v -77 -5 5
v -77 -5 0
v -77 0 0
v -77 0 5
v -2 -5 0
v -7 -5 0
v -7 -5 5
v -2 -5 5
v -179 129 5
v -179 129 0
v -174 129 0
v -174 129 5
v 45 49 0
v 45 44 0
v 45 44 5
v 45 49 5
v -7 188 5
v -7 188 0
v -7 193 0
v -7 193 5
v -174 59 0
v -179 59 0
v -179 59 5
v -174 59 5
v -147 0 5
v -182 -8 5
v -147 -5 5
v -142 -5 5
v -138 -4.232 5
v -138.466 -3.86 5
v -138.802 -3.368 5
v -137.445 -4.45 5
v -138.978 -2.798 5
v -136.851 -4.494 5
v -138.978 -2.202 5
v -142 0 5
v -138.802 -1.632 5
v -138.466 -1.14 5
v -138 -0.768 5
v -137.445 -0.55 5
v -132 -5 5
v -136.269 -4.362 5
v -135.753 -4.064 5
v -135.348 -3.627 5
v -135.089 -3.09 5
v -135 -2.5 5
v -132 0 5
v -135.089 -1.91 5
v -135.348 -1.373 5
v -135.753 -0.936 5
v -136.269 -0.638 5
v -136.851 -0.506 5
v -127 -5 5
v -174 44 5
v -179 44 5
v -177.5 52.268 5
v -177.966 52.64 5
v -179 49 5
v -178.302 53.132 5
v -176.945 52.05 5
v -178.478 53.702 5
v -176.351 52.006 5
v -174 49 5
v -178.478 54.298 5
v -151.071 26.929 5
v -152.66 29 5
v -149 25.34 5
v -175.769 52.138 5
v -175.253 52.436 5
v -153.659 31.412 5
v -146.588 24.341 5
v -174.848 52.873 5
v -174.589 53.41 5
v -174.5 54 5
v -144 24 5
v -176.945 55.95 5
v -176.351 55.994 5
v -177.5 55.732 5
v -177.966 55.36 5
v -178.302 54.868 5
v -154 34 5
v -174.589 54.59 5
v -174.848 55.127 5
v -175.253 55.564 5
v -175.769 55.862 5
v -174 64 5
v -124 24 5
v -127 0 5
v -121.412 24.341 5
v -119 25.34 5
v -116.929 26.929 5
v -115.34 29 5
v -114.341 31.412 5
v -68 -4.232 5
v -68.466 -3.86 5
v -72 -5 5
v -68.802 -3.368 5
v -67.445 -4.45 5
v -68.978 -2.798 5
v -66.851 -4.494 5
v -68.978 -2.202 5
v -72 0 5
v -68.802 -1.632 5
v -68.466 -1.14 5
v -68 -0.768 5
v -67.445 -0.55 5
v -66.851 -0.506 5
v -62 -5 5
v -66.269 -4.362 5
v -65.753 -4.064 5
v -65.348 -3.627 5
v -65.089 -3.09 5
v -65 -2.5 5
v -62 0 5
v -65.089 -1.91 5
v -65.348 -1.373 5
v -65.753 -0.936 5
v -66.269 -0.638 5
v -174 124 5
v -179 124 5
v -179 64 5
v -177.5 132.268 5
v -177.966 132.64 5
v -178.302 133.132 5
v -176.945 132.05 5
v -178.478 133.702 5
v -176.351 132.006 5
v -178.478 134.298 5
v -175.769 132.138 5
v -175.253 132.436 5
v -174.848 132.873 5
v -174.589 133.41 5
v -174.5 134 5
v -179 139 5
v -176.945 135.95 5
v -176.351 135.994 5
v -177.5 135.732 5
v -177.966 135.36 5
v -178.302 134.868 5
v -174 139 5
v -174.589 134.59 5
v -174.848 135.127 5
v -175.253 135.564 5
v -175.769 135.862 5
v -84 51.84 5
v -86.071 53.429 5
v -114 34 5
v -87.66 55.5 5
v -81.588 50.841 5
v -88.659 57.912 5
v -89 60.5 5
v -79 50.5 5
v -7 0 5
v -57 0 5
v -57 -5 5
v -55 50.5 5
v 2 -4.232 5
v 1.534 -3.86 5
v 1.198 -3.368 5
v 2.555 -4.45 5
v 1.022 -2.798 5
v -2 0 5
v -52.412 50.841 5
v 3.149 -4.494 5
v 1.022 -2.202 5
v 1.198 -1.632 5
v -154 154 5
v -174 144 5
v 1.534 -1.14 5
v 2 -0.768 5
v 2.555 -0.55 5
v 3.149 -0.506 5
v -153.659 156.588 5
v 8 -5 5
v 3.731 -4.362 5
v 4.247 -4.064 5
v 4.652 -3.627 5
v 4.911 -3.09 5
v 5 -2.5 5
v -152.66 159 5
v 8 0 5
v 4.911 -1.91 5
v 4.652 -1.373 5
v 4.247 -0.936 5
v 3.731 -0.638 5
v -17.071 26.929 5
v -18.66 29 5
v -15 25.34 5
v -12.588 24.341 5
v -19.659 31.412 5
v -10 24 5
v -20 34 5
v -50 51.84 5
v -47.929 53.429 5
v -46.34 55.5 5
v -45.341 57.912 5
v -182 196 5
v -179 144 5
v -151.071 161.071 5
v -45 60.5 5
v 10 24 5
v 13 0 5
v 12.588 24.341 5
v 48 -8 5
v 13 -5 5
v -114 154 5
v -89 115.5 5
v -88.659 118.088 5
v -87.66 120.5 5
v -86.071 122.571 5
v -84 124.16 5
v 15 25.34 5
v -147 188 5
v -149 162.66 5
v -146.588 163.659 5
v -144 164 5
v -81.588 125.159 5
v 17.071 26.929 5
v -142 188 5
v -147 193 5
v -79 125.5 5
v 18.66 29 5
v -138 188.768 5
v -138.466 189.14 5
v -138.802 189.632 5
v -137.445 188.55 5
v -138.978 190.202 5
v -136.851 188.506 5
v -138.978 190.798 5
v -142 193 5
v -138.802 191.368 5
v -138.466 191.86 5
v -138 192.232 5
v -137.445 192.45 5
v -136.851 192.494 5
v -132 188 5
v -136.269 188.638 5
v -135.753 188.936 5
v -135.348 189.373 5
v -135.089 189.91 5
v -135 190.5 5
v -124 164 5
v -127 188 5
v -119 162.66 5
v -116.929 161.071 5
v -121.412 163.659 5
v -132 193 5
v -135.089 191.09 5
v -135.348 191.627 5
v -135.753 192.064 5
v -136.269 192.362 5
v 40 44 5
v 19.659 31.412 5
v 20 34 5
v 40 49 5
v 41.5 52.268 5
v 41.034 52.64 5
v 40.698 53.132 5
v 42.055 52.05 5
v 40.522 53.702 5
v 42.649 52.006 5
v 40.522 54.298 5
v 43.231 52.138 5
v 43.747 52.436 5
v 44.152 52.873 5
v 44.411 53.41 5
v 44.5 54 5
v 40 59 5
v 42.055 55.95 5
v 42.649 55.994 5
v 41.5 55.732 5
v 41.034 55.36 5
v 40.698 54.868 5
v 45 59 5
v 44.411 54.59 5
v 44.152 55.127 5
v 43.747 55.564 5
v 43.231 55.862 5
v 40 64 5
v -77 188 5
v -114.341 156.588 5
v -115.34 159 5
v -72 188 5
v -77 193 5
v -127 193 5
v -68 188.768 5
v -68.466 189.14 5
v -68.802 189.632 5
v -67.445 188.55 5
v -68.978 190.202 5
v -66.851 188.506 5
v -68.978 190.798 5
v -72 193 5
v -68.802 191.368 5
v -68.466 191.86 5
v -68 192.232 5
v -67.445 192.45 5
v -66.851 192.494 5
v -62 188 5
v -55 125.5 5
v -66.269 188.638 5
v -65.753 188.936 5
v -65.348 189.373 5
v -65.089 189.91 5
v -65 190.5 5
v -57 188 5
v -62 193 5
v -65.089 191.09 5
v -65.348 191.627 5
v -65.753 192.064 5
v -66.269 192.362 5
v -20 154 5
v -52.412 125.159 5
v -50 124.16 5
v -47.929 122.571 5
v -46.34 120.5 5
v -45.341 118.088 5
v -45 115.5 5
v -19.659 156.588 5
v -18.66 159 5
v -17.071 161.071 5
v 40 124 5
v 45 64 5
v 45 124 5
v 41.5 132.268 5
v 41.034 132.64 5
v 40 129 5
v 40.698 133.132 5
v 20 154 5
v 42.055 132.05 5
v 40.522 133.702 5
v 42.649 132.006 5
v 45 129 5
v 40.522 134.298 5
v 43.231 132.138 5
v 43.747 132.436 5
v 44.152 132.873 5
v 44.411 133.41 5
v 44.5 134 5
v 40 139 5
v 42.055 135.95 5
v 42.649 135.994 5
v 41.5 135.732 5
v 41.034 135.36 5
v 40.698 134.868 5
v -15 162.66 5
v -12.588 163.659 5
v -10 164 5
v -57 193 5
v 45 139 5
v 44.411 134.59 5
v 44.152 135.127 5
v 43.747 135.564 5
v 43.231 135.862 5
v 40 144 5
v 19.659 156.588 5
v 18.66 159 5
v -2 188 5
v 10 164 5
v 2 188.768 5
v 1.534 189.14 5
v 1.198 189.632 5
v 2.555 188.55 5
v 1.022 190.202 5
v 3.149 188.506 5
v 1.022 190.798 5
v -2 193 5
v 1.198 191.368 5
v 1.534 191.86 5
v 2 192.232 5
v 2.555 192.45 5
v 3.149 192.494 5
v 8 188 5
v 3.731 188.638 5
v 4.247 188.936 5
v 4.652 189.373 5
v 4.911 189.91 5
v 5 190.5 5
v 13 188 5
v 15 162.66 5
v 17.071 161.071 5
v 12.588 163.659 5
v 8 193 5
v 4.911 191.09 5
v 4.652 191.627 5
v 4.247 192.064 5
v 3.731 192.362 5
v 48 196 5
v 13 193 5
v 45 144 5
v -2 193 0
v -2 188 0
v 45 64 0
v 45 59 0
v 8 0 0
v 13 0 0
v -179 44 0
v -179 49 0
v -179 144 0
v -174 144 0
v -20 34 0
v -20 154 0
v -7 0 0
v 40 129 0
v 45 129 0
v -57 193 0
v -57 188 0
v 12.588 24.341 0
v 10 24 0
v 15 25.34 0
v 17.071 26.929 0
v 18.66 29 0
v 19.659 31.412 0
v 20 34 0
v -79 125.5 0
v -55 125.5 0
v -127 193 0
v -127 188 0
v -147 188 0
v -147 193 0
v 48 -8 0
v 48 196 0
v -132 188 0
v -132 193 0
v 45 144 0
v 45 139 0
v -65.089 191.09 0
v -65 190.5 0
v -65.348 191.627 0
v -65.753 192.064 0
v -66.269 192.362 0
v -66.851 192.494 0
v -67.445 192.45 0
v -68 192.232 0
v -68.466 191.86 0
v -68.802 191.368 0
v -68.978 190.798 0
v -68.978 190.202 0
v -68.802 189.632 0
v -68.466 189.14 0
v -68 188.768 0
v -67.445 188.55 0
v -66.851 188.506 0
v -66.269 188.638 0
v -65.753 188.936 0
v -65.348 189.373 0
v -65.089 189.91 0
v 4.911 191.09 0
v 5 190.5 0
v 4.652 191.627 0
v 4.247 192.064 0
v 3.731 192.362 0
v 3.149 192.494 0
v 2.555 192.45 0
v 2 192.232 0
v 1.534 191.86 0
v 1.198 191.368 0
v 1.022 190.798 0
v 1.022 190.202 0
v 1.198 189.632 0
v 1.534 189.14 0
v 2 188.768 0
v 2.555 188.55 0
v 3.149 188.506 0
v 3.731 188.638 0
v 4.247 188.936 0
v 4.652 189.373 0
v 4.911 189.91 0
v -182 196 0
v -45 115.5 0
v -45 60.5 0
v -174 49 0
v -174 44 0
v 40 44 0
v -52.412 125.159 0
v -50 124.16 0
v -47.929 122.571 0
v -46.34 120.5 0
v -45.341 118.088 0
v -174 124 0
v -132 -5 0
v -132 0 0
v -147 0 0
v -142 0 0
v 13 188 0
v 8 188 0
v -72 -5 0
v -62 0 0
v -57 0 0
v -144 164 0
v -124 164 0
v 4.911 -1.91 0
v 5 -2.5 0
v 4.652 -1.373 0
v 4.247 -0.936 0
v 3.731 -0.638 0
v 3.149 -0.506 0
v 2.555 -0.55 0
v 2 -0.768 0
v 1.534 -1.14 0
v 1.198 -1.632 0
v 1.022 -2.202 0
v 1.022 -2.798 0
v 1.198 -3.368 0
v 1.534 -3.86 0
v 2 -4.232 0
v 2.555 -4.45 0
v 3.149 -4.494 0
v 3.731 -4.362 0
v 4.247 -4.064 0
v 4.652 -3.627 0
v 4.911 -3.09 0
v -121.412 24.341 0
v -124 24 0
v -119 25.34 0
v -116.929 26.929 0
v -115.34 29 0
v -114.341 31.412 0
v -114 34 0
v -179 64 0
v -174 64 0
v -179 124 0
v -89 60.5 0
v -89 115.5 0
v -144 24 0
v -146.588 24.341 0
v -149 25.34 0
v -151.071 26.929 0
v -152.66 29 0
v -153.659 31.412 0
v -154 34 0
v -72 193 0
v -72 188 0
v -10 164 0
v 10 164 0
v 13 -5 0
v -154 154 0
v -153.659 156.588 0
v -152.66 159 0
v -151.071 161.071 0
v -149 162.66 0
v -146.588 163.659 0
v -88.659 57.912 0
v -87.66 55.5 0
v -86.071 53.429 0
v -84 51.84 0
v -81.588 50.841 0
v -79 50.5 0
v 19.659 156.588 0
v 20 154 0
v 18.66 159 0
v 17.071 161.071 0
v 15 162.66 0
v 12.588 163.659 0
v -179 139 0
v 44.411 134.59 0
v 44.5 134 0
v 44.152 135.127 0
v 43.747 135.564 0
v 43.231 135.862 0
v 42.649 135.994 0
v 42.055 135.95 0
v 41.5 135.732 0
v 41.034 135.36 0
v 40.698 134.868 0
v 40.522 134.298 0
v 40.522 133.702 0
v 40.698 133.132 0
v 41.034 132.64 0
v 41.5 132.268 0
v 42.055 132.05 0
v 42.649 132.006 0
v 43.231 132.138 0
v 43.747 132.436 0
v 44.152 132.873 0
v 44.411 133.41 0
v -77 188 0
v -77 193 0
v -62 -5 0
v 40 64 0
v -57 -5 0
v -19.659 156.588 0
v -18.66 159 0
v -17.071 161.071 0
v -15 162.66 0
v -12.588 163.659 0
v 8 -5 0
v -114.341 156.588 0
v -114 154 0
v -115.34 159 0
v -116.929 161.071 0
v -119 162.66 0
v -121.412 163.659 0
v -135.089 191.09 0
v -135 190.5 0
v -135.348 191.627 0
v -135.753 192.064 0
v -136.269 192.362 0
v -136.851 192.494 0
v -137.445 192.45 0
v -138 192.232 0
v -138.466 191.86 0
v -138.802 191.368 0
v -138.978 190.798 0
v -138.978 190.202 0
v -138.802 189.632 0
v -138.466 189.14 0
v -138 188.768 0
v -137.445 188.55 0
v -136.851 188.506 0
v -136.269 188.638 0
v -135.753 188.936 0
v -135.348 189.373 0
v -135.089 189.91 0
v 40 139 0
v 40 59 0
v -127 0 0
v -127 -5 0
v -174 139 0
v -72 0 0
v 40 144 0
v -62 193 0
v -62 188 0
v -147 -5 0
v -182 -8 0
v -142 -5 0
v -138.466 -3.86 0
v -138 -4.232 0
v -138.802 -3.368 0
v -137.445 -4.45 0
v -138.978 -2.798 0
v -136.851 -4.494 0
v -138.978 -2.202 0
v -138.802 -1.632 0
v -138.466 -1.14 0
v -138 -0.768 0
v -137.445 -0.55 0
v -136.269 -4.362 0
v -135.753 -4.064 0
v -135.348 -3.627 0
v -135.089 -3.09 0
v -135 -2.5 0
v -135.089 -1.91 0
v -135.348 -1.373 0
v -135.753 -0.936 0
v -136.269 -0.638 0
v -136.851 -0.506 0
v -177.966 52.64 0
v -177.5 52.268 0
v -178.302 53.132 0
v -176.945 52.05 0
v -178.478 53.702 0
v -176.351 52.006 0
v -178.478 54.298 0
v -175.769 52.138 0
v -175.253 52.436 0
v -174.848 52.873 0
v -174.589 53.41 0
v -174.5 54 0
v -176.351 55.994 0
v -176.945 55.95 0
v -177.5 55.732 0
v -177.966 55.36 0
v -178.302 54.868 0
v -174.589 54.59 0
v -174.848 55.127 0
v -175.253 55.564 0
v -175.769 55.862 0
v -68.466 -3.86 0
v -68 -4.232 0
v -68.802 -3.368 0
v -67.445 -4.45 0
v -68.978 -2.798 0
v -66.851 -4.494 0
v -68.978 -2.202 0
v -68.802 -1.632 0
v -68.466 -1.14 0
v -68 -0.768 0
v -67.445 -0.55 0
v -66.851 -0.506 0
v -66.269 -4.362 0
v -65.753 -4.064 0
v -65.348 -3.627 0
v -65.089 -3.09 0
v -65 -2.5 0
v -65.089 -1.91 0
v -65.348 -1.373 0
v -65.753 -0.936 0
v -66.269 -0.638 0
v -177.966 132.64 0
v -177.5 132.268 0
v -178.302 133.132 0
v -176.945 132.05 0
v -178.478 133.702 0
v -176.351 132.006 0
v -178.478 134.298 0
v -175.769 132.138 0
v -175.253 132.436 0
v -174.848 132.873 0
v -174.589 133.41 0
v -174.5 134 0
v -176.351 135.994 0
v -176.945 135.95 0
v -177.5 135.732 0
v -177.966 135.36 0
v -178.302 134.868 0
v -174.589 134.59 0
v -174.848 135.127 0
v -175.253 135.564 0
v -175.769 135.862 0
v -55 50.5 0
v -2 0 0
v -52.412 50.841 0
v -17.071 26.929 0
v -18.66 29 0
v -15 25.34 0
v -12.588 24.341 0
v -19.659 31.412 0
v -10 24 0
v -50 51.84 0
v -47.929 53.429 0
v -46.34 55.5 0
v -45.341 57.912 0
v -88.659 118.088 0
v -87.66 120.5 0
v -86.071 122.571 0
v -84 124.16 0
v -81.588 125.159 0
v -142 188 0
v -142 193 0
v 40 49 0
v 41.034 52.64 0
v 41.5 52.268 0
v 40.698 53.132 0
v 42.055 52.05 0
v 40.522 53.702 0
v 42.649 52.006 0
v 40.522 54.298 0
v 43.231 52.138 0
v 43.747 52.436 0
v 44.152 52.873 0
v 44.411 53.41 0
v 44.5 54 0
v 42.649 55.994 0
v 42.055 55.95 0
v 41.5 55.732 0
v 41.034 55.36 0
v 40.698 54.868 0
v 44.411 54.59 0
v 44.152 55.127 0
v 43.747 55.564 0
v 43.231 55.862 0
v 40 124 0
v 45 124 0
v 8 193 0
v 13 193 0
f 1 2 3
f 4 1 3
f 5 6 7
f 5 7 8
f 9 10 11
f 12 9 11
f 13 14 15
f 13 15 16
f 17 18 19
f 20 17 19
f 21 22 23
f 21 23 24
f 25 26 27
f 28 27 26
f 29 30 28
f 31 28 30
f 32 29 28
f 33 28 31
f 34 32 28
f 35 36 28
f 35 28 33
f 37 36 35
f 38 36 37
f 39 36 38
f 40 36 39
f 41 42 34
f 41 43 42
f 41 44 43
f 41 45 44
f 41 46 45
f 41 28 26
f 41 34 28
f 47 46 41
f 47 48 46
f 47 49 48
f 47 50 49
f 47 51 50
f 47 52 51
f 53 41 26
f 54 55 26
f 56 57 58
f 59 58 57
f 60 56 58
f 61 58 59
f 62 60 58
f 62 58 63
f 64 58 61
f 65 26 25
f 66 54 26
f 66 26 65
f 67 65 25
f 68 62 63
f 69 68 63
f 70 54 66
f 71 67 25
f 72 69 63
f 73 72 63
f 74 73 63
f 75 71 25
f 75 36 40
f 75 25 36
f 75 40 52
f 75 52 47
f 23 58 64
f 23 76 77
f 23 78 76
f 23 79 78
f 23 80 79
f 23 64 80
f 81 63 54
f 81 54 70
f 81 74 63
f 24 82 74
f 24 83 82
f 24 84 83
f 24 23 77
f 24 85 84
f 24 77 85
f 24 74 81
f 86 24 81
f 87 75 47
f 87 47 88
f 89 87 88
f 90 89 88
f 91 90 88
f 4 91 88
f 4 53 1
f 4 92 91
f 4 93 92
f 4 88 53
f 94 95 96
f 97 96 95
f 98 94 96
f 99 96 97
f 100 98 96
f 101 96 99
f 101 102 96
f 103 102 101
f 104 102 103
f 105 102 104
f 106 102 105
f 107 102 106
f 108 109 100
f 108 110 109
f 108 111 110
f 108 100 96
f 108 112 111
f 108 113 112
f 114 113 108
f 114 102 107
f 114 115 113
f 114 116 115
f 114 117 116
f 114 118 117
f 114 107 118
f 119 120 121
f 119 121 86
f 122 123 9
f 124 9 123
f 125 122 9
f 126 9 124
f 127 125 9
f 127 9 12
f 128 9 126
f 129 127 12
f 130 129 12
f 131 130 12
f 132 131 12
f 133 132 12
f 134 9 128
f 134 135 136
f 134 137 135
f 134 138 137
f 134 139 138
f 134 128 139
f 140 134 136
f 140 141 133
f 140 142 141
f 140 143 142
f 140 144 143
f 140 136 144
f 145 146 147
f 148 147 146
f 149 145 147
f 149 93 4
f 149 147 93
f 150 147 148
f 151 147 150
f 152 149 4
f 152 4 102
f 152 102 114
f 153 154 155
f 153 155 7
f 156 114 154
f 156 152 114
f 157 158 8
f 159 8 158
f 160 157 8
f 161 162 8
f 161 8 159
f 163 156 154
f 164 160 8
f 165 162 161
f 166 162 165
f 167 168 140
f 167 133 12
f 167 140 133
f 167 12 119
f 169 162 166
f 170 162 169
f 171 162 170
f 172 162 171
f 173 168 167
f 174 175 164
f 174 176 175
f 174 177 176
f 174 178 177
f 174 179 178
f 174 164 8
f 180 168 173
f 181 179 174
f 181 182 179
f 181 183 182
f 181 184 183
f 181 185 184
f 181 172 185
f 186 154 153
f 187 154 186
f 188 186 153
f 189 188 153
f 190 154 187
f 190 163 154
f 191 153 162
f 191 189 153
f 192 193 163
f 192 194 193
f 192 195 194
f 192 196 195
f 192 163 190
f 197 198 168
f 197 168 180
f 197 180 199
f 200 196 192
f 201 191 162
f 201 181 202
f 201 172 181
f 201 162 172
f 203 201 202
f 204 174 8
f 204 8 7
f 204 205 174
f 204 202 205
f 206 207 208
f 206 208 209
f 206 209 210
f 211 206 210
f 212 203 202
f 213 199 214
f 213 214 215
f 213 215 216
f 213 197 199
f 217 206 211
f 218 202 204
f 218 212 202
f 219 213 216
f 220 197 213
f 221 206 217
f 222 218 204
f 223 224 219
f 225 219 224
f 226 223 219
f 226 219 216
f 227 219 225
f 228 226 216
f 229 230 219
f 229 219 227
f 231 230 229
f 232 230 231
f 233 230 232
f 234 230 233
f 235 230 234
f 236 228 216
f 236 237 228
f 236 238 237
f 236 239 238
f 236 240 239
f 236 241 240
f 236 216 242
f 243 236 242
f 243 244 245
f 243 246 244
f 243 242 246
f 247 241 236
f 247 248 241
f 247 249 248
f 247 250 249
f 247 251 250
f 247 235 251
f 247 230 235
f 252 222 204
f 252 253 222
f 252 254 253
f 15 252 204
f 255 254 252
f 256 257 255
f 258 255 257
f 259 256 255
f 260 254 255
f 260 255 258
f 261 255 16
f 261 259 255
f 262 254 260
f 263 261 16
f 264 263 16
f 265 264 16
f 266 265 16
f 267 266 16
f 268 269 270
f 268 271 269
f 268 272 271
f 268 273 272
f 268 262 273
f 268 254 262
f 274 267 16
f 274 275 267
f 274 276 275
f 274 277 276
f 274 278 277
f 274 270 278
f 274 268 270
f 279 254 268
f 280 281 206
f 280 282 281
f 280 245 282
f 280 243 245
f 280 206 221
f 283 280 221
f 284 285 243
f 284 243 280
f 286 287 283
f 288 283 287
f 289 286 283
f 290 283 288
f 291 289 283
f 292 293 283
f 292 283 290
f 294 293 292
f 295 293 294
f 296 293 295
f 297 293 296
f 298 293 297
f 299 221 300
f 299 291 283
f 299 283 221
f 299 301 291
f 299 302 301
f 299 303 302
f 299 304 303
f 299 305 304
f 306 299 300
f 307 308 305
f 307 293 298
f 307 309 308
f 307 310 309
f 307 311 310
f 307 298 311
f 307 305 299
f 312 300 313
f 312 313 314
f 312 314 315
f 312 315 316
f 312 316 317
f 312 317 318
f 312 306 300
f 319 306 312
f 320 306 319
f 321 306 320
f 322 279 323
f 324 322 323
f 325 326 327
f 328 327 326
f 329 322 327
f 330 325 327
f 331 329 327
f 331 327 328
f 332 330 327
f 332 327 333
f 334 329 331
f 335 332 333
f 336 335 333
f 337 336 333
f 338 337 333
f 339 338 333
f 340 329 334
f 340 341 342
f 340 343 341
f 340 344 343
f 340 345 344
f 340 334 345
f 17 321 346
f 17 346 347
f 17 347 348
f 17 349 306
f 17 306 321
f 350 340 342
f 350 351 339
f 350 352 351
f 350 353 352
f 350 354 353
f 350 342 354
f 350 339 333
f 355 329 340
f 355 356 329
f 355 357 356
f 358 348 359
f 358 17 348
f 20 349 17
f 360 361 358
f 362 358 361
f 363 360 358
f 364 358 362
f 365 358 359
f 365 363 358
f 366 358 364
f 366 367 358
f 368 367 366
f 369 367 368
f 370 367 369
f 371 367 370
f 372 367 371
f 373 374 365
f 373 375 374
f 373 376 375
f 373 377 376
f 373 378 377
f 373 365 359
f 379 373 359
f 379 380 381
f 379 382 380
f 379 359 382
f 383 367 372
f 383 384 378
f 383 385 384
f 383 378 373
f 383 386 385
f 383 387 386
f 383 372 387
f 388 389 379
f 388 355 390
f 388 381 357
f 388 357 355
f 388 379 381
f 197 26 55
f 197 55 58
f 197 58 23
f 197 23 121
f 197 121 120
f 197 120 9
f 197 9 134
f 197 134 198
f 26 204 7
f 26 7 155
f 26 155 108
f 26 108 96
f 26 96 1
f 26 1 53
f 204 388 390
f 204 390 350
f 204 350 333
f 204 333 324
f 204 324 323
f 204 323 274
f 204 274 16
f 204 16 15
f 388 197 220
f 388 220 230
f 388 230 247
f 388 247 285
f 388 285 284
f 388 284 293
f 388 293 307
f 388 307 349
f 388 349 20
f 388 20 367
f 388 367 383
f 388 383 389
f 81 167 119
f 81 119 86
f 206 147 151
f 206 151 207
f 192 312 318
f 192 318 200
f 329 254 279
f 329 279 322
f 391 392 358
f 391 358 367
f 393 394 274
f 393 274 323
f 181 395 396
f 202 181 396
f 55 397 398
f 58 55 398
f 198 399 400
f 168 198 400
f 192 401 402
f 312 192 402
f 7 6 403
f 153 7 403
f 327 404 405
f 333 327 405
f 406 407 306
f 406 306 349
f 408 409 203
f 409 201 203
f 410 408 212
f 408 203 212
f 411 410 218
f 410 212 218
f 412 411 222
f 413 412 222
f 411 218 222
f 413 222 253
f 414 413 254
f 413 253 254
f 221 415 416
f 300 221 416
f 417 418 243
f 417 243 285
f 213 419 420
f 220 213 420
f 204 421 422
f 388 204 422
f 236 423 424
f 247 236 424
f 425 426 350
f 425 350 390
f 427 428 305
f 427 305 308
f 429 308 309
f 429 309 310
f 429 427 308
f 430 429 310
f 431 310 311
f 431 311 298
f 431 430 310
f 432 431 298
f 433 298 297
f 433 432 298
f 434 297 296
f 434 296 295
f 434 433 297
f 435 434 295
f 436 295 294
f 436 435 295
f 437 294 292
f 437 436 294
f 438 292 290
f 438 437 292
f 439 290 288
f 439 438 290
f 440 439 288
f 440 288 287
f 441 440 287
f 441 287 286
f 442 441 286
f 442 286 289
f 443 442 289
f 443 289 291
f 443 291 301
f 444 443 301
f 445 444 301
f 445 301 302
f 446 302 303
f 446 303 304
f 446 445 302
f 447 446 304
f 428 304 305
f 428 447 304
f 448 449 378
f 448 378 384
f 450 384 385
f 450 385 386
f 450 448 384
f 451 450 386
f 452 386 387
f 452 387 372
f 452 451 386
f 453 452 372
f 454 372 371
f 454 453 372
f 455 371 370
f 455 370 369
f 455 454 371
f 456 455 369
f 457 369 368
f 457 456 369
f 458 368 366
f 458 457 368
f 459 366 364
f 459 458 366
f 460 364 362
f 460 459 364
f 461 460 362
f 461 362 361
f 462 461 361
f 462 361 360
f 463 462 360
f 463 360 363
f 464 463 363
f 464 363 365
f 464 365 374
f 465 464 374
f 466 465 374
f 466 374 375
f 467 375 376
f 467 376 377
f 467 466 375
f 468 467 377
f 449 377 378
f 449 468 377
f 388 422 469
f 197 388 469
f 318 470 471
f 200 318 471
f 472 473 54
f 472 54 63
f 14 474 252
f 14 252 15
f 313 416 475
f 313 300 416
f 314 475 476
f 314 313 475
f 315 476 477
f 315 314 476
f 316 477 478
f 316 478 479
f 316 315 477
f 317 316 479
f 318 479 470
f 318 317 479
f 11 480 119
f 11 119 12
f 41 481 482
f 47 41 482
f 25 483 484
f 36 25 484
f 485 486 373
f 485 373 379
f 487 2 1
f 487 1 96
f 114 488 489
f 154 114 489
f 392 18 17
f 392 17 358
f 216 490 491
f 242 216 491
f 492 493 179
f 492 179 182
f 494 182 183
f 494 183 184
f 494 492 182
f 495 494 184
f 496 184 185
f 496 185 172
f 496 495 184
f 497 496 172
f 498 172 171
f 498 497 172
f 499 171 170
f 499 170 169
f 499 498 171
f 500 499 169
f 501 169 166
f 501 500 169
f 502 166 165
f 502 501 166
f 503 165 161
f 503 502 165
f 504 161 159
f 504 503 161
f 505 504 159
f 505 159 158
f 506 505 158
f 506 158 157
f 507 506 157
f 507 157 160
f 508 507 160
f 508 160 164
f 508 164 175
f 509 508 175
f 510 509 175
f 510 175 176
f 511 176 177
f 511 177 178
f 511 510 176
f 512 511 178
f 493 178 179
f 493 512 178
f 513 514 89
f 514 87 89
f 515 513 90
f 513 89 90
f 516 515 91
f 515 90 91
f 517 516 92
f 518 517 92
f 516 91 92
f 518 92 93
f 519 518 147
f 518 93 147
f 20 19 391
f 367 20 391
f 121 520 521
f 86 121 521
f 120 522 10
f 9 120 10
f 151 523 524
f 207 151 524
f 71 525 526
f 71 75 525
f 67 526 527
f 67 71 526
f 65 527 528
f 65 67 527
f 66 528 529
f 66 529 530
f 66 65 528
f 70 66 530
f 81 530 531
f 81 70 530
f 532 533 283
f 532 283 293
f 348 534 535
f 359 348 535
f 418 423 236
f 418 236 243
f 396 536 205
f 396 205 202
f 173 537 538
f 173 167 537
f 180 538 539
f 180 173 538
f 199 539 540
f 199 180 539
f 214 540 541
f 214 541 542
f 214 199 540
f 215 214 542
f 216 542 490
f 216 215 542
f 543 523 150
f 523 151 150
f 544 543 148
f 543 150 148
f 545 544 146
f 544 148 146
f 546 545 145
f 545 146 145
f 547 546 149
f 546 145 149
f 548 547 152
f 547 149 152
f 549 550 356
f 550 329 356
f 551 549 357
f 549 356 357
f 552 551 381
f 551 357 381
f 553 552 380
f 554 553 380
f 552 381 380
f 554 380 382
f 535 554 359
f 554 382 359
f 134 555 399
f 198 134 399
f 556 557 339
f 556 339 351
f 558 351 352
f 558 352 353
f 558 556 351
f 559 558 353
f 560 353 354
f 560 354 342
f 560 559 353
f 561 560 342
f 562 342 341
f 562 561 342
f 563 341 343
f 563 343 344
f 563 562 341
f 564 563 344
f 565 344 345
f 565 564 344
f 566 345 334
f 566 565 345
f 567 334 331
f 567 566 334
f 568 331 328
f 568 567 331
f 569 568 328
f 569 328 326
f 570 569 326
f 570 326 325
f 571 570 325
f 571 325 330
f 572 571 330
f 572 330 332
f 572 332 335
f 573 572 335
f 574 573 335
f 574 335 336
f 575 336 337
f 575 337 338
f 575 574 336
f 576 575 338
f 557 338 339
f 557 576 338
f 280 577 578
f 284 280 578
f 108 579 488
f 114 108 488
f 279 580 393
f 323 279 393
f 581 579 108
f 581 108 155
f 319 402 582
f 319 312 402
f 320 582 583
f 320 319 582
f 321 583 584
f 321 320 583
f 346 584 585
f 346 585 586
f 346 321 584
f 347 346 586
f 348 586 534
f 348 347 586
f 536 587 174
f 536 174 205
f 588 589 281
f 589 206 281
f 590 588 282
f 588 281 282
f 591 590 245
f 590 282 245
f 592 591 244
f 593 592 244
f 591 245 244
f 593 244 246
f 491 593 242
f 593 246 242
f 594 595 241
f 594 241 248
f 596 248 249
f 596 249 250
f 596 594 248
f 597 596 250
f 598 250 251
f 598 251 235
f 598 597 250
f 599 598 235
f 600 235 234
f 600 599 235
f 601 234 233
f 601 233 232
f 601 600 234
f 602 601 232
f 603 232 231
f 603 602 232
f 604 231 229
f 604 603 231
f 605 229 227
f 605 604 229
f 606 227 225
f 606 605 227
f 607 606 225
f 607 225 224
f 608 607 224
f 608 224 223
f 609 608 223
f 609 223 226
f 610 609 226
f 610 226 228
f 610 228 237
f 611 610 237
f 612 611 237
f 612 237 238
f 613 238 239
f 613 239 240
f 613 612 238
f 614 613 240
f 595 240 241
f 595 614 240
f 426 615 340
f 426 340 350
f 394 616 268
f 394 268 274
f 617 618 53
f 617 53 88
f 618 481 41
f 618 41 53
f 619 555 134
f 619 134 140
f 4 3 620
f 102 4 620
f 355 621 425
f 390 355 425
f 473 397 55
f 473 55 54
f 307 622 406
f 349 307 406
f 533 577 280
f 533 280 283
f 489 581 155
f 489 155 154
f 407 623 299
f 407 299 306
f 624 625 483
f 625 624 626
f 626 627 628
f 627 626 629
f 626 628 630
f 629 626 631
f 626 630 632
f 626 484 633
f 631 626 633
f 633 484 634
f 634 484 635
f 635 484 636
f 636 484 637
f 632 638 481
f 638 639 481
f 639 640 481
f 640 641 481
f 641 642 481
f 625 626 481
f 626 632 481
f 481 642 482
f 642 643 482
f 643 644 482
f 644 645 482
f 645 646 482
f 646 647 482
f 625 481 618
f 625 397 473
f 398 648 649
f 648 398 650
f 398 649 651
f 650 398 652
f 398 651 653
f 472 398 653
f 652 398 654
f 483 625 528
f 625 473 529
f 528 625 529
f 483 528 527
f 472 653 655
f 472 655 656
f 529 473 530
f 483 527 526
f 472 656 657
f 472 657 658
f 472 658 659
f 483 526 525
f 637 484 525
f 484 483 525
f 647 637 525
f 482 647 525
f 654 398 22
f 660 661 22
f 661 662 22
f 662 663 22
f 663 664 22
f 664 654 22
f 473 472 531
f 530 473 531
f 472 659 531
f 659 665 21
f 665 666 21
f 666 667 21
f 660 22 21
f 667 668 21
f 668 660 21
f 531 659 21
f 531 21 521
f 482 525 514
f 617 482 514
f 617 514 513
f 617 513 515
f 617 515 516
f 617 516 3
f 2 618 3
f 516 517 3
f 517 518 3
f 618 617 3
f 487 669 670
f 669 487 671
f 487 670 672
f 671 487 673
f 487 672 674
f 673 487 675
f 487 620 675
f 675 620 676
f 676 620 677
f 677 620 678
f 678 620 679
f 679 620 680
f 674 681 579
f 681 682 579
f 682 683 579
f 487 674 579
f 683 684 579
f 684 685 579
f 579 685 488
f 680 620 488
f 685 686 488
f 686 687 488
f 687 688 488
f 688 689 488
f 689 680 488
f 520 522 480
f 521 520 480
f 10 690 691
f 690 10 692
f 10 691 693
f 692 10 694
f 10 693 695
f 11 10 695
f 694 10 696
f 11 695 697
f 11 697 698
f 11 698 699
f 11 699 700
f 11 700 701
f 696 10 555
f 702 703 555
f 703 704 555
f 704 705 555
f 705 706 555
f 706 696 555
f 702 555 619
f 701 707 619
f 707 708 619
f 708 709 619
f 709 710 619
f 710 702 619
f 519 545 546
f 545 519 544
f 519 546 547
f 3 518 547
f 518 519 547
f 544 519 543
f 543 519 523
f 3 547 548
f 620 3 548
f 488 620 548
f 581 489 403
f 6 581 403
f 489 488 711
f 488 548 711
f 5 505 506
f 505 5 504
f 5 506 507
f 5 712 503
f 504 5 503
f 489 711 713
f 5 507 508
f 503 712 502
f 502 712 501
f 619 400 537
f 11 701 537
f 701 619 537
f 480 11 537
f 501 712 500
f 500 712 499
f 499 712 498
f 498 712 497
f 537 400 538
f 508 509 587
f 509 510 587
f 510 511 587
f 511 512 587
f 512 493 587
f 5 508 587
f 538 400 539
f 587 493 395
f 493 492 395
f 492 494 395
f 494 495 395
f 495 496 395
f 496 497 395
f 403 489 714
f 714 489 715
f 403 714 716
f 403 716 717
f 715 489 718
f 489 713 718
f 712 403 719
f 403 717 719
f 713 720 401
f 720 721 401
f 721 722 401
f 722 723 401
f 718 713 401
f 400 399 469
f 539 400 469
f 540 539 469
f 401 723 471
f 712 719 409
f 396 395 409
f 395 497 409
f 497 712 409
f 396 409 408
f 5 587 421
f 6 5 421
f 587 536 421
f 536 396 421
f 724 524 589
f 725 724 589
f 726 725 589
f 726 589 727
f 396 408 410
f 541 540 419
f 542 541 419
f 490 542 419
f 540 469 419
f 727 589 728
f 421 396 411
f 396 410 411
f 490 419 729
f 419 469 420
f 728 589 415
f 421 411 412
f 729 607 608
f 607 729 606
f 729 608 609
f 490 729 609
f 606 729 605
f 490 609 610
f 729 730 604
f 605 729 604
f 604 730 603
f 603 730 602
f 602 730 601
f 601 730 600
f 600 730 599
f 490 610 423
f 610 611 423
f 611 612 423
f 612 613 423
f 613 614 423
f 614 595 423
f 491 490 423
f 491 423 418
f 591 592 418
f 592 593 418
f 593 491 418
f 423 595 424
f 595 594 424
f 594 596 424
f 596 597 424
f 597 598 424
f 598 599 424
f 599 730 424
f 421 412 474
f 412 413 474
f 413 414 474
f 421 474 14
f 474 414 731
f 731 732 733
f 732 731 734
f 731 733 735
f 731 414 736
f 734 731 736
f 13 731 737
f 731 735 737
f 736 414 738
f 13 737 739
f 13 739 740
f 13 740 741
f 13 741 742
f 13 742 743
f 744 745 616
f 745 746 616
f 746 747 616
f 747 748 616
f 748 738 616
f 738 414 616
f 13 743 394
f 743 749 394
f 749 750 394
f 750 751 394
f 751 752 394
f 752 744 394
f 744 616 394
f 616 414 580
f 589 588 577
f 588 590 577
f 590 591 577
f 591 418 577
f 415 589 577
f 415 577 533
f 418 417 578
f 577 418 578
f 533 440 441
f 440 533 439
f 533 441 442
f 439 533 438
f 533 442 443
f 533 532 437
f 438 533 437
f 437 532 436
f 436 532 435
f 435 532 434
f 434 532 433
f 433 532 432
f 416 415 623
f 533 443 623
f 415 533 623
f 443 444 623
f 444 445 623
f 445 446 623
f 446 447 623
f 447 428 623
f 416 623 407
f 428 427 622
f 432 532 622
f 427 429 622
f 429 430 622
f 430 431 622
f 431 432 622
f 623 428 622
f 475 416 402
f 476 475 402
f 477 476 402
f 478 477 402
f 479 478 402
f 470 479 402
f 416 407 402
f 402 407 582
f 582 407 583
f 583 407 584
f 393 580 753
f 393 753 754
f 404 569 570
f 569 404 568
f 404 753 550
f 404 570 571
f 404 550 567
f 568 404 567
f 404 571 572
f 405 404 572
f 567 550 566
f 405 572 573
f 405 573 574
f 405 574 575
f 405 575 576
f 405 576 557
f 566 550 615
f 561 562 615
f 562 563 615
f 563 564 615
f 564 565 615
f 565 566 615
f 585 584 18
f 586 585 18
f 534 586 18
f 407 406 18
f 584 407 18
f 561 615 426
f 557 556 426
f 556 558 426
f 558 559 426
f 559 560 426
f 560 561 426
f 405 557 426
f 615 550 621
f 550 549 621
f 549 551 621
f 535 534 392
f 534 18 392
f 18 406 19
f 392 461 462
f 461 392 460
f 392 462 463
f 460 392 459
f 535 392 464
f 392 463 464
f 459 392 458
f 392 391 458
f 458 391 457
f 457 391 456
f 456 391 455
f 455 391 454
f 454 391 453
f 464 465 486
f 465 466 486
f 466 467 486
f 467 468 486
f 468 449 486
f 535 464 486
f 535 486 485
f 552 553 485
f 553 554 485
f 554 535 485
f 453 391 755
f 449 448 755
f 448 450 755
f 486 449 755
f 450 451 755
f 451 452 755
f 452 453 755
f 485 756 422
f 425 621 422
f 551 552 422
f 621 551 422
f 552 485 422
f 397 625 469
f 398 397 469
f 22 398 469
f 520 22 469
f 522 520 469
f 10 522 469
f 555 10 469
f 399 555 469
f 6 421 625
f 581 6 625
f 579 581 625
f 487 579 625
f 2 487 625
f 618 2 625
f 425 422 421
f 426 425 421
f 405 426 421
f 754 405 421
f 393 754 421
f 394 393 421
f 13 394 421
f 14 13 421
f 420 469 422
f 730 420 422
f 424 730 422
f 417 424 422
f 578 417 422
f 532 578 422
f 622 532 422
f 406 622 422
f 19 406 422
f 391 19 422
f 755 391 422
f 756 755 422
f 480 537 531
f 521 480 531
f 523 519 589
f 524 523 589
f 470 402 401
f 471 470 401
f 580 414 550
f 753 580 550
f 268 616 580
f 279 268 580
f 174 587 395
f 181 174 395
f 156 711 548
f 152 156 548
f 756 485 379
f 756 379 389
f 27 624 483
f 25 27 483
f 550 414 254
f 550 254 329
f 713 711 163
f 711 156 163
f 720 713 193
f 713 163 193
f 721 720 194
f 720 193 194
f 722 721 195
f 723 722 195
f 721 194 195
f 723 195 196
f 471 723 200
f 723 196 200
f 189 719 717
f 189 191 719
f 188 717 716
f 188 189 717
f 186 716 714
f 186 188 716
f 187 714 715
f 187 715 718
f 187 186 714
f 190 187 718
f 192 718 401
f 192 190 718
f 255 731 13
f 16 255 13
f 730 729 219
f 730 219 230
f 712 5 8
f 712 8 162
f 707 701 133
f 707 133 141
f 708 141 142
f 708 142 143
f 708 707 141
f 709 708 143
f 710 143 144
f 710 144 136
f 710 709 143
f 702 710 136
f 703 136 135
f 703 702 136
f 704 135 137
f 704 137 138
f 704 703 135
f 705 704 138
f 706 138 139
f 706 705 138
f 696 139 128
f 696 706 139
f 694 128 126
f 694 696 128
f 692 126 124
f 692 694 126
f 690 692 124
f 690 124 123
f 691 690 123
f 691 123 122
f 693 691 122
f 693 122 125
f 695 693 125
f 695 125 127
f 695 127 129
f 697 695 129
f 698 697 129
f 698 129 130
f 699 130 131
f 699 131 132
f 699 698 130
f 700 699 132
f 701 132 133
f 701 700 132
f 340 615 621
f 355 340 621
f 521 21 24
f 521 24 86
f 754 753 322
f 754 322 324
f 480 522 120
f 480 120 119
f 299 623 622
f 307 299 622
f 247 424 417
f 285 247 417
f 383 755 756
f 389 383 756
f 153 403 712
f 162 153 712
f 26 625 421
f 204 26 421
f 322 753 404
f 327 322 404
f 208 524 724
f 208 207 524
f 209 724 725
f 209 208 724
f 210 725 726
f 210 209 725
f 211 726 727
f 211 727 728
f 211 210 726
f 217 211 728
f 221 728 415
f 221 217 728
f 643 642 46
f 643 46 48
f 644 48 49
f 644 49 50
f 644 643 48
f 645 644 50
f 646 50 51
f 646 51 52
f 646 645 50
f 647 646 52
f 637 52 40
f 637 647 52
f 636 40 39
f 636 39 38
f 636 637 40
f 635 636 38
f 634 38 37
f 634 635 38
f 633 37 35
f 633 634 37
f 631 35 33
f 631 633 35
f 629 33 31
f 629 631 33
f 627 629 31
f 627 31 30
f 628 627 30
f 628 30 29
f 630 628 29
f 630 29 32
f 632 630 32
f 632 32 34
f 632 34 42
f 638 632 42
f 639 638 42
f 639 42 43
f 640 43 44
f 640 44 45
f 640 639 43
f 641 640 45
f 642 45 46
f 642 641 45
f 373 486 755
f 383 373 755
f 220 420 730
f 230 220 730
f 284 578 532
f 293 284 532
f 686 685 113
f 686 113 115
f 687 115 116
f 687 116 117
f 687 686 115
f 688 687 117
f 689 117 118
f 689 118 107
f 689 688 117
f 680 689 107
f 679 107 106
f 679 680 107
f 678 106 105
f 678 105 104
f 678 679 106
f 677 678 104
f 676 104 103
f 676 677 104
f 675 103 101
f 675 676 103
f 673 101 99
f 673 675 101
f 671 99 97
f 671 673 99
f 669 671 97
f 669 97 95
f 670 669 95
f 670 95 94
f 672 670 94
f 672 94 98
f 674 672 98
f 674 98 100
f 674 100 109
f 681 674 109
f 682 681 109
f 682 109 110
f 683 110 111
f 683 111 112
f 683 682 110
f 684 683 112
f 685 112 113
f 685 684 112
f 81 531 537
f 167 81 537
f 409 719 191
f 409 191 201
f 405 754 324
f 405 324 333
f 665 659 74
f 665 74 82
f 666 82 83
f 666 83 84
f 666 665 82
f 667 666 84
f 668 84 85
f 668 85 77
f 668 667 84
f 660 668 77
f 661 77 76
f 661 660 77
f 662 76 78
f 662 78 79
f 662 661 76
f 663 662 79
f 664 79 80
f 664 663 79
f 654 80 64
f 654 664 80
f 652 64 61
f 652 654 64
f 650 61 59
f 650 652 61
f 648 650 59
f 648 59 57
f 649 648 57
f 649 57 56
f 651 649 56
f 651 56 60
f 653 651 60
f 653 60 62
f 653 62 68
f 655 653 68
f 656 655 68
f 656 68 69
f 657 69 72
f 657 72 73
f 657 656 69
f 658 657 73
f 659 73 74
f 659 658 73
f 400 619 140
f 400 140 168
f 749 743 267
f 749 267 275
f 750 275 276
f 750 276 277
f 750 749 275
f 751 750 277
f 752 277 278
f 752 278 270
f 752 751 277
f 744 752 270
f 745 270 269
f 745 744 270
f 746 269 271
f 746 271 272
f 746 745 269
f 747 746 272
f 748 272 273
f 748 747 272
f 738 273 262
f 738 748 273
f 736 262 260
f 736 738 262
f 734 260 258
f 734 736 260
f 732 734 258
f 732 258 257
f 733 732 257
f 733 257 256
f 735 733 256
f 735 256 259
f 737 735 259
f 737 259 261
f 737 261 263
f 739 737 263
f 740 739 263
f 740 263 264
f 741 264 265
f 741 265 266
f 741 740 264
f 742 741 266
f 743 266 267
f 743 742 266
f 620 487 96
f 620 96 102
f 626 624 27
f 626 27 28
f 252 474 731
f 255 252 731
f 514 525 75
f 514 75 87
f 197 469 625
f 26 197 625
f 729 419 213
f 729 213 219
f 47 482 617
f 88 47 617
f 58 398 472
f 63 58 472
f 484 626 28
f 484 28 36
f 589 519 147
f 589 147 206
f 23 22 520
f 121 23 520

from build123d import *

# Parameters (mm, degrees)
ESQUISSE1_W        = 5
ESQUISSE1_H        = 5
ESQUISSE1_R        = 2
ESQUISSE1_W_2      = 40
ESQUISSE1_H_2      = 140
BOSS_EXTRU_1_DEPTH = 5
CONG_1_R           = 10


with BuildPart() as part:
    # Esquisse1 → Boss.-Extru.1 (new body)
    with BuildSketch(Plane.XY):
        Polygon((-182, 196), (-182, 188), (-182, 0), (-182, -8), (48, -8), (48, 0), (48, 188), (48, 196), align=None)
        with Locations((-144.5, -2.5)):
            Rectangle(ESQUISSE1_W, ESQUISSE1_H, mode=Mode.SUBTRACT)
        with Locations((-137, -2.5)):
            Circle(ESQUISSE1_R, mode=Mode.SUBTRACT)
        with Locations((-129.5, -2.5)):
            Rectangle(ESQUISSE1_W, ESQUISSE1_H, mode=Mode.SUBTRACT)
        with Locations((-74.5, -2.5)):
            Rectangle(ESQUISSE1_W, ESQUISSE1_H, mode=Mode.SUBTRACT)
        with Locations((-67, -2.5)):
            Circle(ESQUISSE1_R, mode=Mode.SUBTRACT)
        with Locations((-59.5, -2.5)):
            Rectangle(ESQUISSE1_W, ESQUISSE1_H, mode=Mode.SUBTRACT)
        with Locations((-4.5, -2.5)):
            Rectangle(ESQUISSE1_W, ESQUISSE1_H, mode=Mode.SUBTRACT)
        with Locations((3, -2.5)):
            Circle(ESQUISSE1_R, mode=Mode.SUBTRACT)
        with Locations((10.5, -2.5)):
            Rectangle(ESQUISSE1_W, ESQUISSE1_H, mode=Mode.SUBTRACT)
        with Locations((-176.5, 46.5)):
            Rectangle(ESQUISSE1_W, ESQUISSE1_H, mode=Mode.SUBTRACT)
        with Locations((-176.5, 54)):
            Circle(ESQUISSE1_R, mode=Mode.SUBTRACT)
        with Locations((-176.5, 61.5)):
            Rectangle(ESQUISSE1_W, ESQUISSE1_H, mode=Mode.SUBTRACT)
        with Locations((-134, 94)):
            Rectangle(ESQUISSE1_W_2, ESQUISSE1_H_2, mode=Mode.SUBTRACT)
        with Locations((-176.5, 126.5)):
            Rectangle(ESQUISSE1_W, ESQUISSE1_H, mode=Mode.SUBTRACT)
        with Locations((-176.5, 134)):
            Circle(ESQUISSE1_R, mode=Mode.SUBTRACT)
        with Locations((-176.5, 141.5)):
            Rectangle(ESQUISSE1_W, ESQUISSE1_H, mode=Mode.SUBTRACT)
        with Locations((-144.5, 190.5)):
            Rectangle(ESQUISSE1_W, ESQUISSE1_H, mode=Mode.SUBTRACT)
        with Locations((-137, 190.5)):
            Circle(ESQUISSE1_R, mode=Mode.SUBTRACT)
        with Locations((-129.5, 190.5)):
            Rectangle(ESQUISSE1_W, ESQUISSE1_H, mode=Mode.SUBTRACT)
        with Locations((-74.5, 190.5)):
            Rectangle(ESQUISSE1_W, ESQUISSE1_H, mode=Mode.SUBTRACT)
        Polygon((-89, 125.5), (-45, 125.5), (-45, 50.5), (-67, 50.5), (-89, 50.5), align=None, mode=Mode.SUBTRACT)
        with Locations((42.5, 46.5)):
            Rectangle(ESQUISSE1_W, ESQUISSE1_H, mode=Mode.SUBTRACT)
        with Locations((0, 94)):
            Rectangle(ESQUISSE1_W_2, ESQUISSE1_H_2, mode=Mode.SUBTRACT)
        with Locations((42.5, 54)):
            Circle(ESQUISSE1_R, mode=Mode.SUBTRACT)
        with Locations((42.5, 61.5)):
            Rectangle(ESQUISSE1_W, ESQUISSE1_H, mode=Mode.SUBTRACT)
        with Locations((-67, 190.5)):
            Circle(ESQUISSE1_R, mode=Mode.SUBTRACT)
        with Locations((-59.5, 190.5)):
            Rectangle(ESQUISSE1_W, ESQUISSE1_H, mode=Mode.SUBTRACT)
        with Locations((42.5, 126.5)):
            Rectangle(ESQUISSE1_W, ESQUISSE1_H, mode=Mode.SUBTRACT)
        with Locations((42.5, 134)):
            Circle(ESQUISSE1_R, mode=Mode.SUBTRACT)
        with Locations((42.5, 141.5)):
            Rectangle(ESQUISSE1_W, ESQUISSE1_H, mode=Mode.SUBTRACT)
        with Locations((-4.5, 190.5)):
            Rectangle(ESQUISSE1_W, ESQUISSE1_H, mode=Mode.SUBTRACT)
        with Locations((3, 190.5)):
            Circle(ESQUISSE1_R, mode=Mode.SUBTRACT)
        with Locations((10.5, 190.5)):
            Rectangle(ESQUISSE1_W, ESQUISSE1_H, mode=Mode.SUBTRACT)
    extrude(amount=BOSS_EXTRU_1_DEPTH)

    # Congé1
    cong_1_edges = [part.edges().sort_by_distance(p)[0] for p in [
        (-154, 24, 2.5),
        (-114, 24, 2.5),
        (-114, 164, 2.5),
        (-154, 164, 2.5),
        (-20, 164, 2.5),
        (-20, 24, 2.5),
        (20, 24, 2.5),
        (20, 164, 2.5),
        (-45, 125.5, 2.5),
        (-89, 125.5, 2.5),
        (-89, 50.5, 2.5),
        (-45, 50.5, 2.5),
    ]]
    fillet(cong_1_edges, radius=CONG_1_R)


solid = part.part
